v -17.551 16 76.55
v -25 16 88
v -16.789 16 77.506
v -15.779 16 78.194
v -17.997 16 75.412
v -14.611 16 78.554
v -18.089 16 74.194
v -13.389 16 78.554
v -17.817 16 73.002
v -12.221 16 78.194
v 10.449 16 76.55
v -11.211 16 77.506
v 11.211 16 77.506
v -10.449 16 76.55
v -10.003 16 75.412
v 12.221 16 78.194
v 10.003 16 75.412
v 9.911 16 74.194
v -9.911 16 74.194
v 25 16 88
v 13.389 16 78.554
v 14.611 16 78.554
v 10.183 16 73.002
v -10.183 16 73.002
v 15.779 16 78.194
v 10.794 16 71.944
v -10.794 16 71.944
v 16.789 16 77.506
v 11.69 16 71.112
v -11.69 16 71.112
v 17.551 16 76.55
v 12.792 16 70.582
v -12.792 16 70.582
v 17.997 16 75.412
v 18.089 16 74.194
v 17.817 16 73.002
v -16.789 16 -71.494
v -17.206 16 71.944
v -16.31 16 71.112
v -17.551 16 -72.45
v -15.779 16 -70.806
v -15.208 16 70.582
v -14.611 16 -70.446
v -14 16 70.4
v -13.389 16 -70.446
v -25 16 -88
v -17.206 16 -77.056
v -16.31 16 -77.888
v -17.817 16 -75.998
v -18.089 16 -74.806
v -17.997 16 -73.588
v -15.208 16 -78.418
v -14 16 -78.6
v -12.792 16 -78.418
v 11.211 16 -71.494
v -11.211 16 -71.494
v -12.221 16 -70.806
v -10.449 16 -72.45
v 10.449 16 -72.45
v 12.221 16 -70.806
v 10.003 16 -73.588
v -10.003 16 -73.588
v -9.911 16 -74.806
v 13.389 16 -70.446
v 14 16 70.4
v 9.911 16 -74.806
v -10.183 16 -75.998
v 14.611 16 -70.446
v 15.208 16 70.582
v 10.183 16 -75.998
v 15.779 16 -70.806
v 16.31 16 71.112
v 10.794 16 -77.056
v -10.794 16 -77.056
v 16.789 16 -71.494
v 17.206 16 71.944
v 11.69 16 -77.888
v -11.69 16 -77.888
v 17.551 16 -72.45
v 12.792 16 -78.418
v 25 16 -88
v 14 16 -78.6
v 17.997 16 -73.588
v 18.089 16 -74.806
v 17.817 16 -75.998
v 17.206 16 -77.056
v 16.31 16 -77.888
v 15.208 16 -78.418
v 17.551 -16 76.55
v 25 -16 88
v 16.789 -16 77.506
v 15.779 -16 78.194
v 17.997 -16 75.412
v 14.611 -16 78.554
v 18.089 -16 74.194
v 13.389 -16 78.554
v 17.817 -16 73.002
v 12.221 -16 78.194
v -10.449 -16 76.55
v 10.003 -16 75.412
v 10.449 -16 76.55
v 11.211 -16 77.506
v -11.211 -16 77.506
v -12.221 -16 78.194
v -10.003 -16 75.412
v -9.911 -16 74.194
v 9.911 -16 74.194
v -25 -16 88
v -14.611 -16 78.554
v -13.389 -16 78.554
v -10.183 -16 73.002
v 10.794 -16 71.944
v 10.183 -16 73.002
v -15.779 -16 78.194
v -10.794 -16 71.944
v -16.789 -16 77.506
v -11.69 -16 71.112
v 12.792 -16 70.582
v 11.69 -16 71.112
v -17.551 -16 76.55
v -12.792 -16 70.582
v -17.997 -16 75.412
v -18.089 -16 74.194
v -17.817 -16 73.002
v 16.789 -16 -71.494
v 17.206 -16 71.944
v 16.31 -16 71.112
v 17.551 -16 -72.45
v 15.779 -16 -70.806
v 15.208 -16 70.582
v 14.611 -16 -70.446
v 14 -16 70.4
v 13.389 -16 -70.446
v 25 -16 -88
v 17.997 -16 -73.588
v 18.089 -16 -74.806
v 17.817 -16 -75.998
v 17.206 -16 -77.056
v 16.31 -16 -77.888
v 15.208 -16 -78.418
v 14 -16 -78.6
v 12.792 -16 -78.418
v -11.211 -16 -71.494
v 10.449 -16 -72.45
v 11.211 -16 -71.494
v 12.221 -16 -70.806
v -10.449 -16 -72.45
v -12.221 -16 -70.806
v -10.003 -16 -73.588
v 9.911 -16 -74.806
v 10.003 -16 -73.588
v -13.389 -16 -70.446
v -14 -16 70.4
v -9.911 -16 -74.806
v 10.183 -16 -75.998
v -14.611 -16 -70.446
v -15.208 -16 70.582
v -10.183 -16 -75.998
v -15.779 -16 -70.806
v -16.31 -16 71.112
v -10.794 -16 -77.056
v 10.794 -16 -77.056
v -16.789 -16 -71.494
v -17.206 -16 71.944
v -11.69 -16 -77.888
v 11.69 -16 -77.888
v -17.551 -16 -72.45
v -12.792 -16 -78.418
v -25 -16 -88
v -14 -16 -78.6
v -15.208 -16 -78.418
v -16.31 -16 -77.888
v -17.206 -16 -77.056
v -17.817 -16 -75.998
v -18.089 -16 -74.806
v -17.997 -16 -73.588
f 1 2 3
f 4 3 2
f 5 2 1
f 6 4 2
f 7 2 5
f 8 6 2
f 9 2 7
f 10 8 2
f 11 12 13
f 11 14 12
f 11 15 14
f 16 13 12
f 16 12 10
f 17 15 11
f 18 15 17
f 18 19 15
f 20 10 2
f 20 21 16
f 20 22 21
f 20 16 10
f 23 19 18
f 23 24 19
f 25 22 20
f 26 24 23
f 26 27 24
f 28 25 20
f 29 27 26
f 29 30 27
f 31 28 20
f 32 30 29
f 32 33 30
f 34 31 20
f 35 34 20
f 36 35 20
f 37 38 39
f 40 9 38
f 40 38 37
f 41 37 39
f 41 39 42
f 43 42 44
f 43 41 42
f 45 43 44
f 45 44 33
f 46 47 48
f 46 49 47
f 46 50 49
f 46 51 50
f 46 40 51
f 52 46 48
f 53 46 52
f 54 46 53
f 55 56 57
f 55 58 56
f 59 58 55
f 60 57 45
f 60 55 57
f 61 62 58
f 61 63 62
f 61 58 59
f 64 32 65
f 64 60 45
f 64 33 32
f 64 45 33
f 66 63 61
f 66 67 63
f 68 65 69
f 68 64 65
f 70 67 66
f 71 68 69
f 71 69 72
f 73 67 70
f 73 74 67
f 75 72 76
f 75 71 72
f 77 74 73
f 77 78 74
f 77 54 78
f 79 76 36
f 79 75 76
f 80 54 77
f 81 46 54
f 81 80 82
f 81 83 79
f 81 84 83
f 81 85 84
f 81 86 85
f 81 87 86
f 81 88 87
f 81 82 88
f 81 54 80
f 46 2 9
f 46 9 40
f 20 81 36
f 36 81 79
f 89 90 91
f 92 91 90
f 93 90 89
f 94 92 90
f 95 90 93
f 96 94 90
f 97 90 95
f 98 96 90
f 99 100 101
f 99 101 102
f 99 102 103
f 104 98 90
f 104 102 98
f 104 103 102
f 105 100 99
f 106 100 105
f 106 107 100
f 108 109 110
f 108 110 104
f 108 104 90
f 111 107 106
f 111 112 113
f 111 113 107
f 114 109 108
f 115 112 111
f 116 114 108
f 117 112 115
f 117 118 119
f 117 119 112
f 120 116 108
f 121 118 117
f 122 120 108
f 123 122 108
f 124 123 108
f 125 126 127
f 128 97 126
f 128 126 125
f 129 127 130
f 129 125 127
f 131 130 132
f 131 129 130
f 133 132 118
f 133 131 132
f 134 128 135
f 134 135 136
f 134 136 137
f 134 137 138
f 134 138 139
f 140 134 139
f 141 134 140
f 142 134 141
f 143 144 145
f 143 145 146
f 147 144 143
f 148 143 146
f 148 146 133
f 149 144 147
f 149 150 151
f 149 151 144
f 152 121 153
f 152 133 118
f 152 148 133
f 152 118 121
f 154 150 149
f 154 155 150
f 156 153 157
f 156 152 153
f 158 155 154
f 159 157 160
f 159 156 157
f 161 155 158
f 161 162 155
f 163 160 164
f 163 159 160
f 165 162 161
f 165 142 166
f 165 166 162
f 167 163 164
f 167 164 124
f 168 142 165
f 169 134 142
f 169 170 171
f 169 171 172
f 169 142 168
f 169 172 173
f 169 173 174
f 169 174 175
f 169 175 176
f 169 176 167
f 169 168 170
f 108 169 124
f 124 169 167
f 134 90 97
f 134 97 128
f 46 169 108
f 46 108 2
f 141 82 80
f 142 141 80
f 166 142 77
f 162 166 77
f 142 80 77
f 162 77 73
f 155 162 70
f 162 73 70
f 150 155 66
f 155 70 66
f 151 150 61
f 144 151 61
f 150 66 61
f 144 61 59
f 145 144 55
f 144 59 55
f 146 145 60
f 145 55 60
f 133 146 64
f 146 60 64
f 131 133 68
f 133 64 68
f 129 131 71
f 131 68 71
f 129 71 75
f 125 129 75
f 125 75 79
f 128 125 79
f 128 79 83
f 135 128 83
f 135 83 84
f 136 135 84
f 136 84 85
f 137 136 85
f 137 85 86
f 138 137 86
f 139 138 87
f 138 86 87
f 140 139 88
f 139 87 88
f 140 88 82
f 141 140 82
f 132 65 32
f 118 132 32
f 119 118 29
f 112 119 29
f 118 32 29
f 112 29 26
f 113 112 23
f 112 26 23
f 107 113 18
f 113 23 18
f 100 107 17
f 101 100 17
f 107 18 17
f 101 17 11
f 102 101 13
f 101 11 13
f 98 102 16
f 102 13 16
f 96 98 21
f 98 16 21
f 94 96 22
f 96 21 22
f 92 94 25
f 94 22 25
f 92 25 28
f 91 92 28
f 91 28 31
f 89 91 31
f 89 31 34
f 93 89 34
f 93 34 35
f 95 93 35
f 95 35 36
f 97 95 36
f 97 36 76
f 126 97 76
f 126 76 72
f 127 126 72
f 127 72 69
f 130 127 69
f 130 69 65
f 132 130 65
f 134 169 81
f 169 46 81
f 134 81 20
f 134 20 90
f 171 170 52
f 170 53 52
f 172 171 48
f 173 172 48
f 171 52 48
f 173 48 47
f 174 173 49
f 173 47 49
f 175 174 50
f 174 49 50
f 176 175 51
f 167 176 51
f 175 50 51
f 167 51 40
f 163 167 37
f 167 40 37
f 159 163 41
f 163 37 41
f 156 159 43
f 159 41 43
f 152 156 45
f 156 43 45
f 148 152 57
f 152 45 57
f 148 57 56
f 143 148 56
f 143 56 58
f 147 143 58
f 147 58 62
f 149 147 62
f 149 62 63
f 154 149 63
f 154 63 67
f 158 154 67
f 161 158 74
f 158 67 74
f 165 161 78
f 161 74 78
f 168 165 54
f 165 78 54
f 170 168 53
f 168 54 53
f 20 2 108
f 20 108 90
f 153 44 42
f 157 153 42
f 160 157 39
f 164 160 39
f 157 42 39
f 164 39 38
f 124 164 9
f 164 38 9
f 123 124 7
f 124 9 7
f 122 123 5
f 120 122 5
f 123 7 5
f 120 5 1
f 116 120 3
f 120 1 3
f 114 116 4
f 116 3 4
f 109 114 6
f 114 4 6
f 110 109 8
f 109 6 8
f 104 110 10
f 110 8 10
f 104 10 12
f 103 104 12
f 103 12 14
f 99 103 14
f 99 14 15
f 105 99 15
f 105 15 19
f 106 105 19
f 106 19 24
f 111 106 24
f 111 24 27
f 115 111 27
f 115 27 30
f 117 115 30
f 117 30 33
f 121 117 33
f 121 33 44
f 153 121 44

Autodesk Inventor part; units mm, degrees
ref_plane "YZ Plane" through (0, 0, 0) normal (1, 0, 0) x (0, 1, 0)
ref_plane "XZ Plane" through (0, 0, 0) normal (0, 1, 0) x (-1, 0, 0)
ref_plane "XY Plane" through (0, 0, 0) normal (0, 0, 1) x (1, 0, 0)
sketch "Sketch2" plane through (0, 0, 0) normal (0, 0, 1) x (1, 0, 0)
  line L0 (-25, 16) -> (25, 16)
  line L1 (25, 16) -> (25, -16)
  line L2 (25, -16) -> (-25, -16)
  line L3 (-25, -16) -> (-25, 16)
  line L4 (-25, 16) -> (25, -16) construction
  line L5 (25, 16) -> (-25, -16) construction
  point P0 (0, 0)
  dimension "d4" = 32
  dimension "d5" = 50
extrude "Extrusion1" add sketch "Sketch2" along normal mid plane 176
sketch "Sketch5" plane through (0, 0, -88) normal (0, 0, -1) x (-1, 0, 0)
  line L0 (-14, 0) -> (-25, 0) construction
  line L1 (-25, -16) -> (-25, 16) projected
  line L2 (14, 0) -> (25, 0) construction
  line L3 (25, 16) -> (25, -16) projected
  line L4 (-25, 0) -> (25, 0) construction
  point P0 (0, 0)
  dimension "d14" = 28
sketch "Sketch6" plane through (-25, -16, -88) normal (0, -1, 0) x (1, 0, 0)
  point P0 (25, 88)
sketch "Sketch9" plane through (-25, -16, 88) normal (0, -1, 0) x (1, 0, 0)
  line L0 (0, 0) -> (50, 0) projected
  line L1 (39, 0) -> (39, -176) construction
  line L2 (0, -176) -> (50, -176) projected
  line L3 (50, -176) -> (0, -176) construction
  line L4 (39, -13.5) -> (50, -13.5) construction
  line L5 (50, -176) -> (50, 0) construction
  line L6 (11, -13.5) -> (0, -13.5) construction
  line L7 (0, 0) -> (0, -176) construction
  line L8 (11, -13.5) -> (11, 0)
  line L9 (11, -162.5) -> (0, -162.5) construction
  line L10 (11, -162.5) -> (11, -176) construction
  point P0 (25, -88)
  point P1 (39, -162.5)
  dimension "d36" = 28
  dimension "d37" = 28
  dimension "d38" = 149
hole "Hole3" at (14, -16, 74.5) at (-14, -16, 74.5) at (14, -16, -74.5) at (-14, -16, -74.5) direction (0, 1, 0) diameter 8.2 end through all
properties part number "13042026-05"
